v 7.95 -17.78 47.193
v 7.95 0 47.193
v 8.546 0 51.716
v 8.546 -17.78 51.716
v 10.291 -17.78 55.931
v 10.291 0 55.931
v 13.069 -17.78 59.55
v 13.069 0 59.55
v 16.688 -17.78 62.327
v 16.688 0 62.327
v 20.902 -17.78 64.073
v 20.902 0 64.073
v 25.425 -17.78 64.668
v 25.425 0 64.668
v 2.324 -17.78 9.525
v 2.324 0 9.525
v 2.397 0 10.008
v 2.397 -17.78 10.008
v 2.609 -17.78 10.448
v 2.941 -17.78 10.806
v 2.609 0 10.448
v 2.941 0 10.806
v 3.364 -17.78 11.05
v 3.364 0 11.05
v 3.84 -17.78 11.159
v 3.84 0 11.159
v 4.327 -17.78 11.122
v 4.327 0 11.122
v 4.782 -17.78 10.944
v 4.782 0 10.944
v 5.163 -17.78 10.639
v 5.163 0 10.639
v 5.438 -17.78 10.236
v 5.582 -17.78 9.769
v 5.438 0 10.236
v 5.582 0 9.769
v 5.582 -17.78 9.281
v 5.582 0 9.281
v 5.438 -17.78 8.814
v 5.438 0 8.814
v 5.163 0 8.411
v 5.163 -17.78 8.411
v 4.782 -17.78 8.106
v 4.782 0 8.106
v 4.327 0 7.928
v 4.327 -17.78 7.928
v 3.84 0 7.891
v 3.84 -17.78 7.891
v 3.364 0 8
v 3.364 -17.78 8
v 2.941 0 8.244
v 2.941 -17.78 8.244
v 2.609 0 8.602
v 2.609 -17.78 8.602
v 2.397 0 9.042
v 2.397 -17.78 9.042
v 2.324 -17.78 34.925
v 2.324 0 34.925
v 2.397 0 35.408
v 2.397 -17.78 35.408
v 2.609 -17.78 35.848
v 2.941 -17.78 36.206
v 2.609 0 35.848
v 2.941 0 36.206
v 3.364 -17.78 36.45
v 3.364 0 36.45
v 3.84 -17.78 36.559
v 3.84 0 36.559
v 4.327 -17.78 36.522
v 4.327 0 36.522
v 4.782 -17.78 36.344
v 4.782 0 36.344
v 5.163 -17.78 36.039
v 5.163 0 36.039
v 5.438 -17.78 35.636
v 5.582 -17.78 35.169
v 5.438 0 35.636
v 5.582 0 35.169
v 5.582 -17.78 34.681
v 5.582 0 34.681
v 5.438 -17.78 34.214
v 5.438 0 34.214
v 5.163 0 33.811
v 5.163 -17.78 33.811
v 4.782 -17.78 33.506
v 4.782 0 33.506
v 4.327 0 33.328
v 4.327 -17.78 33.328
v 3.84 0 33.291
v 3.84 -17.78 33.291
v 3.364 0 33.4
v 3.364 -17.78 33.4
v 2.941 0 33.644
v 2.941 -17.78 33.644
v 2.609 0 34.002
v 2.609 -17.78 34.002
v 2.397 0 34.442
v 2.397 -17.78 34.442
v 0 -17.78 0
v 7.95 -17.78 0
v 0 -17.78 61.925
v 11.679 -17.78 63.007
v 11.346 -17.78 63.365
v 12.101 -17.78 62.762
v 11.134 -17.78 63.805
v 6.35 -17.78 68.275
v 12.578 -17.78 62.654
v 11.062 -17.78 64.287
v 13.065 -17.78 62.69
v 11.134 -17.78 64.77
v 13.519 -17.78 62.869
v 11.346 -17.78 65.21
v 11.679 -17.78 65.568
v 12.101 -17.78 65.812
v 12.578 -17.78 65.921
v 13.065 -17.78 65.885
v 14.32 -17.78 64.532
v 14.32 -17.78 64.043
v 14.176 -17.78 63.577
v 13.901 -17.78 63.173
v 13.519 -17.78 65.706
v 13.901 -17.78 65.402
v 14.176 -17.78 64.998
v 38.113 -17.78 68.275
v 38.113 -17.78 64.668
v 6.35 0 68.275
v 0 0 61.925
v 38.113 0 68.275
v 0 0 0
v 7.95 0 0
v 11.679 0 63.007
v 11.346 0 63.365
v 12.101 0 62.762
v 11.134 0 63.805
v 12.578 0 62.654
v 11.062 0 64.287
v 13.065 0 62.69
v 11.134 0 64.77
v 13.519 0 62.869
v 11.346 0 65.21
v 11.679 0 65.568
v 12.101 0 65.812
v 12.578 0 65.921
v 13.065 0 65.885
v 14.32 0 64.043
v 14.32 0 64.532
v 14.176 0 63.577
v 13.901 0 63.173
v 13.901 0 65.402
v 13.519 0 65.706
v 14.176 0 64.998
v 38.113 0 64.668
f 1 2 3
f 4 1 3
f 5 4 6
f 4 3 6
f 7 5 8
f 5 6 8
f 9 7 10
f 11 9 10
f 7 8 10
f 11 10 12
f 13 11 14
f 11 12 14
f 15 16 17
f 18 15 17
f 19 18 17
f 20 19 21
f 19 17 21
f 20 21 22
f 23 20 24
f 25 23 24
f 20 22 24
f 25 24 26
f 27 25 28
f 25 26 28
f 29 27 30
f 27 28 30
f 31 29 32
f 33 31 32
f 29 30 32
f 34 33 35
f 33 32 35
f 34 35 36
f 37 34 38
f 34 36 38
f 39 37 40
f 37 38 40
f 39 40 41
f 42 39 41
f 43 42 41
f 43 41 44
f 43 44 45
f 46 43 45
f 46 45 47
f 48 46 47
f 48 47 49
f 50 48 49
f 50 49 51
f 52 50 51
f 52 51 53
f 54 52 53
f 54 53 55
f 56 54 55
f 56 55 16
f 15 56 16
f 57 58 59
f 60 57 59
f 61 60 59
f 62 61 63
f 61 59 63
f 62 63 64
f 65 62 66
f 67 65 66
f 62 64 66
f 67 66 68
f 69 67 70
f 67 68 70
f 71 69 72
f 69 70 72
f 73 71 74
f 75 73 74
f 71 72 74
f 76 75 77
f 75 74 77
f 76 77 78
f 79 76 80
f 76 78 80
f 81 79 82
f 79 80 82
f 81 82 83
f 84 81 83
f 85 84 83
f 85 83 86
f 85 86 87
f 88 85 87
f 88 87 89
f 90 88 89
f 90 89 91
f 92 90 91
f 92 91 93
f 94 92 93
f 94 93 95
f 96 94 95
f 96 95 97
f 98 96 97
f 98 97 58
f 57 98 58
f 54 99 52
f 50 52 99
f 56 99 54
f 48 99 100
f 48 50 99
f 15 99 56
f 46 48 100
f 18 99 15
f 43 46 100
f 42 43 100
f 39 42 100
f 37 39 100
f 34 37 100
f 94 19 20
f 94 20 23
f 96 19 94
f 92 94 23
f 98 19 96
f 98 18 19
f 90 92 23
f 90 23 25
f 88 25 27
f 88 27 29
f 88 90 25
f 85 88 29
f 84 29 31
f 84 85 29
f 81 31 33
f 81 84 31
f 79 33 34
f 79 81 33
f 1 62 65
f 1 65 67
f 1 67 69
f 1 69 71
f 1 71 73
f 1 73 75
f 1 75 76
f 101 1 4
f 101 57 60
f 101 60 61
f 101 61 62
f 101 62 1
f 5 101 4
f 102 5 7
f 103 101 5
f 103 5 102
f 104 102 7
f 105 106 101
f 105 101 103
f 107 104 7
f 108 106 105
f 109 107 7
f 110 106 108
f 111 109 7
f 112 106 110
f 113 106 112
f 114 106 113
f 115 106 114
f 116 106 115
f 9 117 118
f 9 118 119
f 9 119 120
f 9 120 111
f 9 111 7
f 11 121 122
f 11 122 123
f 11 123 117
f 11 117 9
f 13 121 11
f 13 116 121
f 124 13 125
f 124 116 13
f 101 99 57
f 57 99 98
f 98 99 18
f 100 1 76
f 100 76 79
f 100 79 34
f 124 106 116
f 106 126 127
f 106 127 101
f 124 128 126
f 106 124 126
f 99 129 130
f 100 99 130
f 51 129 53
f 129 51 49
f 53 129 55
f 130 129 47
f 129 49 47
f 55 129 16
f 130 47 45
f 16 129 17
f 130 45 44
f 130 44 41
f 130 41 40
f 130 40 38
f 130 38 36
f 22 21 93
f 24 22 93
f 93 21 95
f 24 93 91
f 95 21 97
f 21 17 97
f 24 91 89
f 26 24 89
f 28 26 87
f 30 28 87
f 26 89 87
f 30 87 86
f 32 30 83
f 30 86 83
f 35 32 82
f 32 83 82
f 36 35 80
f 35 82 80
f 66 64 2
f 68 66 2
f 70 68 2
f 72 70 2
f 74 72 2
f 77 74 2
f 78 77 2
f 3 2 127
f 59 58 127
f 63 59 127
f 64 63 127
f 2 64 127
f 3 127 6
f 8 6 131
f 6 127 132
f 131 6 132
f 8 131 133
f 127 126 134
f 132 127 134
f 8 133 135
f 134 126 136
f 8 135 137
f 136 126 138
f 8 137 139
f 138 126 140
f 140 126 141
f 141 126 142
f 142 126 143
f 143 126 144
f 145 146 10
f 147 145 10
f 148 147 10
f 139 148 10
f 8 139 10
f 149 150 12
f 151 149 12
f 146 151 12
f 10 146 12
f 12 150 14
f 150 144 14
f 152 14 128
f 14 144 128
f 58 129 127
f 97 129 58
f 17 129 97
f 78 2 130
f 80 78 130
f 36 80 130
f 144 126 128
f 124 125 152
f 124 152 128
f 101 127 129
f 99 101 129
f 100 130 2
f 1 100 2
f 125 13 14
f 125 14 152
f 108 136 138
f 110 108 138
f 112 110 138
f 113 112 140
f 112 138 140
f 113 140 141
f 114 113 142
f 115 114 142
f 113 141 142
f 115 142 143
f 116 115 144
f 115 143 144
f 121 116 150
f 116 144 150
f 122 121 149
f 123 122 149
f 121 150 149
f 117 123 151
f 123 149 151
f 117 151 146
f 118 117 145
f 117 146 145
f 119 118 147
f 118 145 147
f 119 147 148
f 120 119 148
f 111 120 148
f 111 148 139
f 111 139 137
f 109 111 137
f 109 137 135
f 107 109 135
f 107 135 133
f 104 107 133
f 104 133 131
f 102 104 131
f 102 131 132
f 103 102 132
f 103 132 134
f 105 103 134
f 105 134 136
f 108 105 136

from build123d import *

# Parameters (mm, degrees)
F1_DEPTH = 17.78
F2_SIZE  = 6.35
F4_D     = 3.2766


with BuildPart() as f1:
    # F0 (on Front) → F1 (new body)
    with BuildSketch(Plane.XZ):
        with BuildLine():
            Line((0, 68.2752), (0, 0))
            Line((0, 0), (7.9502, 0))
            Line((7.9502, 0), (7.9502, 47.1932))
            ThreePointArc((7.9502, 47.1932), (13.068568, 59.550032), (25.4254, 64.6684))
            Line((25.4254, 64.6684), (38.1127, 64.6684))
            Line((38.1127, 64.6684), (38.1127, 68.2752))
            Line((38.1127, 68.2752), (0, 68.2752))
        make_face()
    extrude(amount=F1_DEPTH)

    # F2
    f2_edges = [f1.edges().sort_by_distance(p)[0] for p in [
        (0, -8.89, 68.2752),
    ]]
    chamfer(f2_edges, length=F2_SIZE)

    # F4 (through all)
    with Locations(Plane.XZ.offset(17.78)):
        with Locations((12.7, 64.2874), (3.9624, 9.525), (3.9624, 34.925)):
            Hole(F4_D / 2)


solid = f1.part
